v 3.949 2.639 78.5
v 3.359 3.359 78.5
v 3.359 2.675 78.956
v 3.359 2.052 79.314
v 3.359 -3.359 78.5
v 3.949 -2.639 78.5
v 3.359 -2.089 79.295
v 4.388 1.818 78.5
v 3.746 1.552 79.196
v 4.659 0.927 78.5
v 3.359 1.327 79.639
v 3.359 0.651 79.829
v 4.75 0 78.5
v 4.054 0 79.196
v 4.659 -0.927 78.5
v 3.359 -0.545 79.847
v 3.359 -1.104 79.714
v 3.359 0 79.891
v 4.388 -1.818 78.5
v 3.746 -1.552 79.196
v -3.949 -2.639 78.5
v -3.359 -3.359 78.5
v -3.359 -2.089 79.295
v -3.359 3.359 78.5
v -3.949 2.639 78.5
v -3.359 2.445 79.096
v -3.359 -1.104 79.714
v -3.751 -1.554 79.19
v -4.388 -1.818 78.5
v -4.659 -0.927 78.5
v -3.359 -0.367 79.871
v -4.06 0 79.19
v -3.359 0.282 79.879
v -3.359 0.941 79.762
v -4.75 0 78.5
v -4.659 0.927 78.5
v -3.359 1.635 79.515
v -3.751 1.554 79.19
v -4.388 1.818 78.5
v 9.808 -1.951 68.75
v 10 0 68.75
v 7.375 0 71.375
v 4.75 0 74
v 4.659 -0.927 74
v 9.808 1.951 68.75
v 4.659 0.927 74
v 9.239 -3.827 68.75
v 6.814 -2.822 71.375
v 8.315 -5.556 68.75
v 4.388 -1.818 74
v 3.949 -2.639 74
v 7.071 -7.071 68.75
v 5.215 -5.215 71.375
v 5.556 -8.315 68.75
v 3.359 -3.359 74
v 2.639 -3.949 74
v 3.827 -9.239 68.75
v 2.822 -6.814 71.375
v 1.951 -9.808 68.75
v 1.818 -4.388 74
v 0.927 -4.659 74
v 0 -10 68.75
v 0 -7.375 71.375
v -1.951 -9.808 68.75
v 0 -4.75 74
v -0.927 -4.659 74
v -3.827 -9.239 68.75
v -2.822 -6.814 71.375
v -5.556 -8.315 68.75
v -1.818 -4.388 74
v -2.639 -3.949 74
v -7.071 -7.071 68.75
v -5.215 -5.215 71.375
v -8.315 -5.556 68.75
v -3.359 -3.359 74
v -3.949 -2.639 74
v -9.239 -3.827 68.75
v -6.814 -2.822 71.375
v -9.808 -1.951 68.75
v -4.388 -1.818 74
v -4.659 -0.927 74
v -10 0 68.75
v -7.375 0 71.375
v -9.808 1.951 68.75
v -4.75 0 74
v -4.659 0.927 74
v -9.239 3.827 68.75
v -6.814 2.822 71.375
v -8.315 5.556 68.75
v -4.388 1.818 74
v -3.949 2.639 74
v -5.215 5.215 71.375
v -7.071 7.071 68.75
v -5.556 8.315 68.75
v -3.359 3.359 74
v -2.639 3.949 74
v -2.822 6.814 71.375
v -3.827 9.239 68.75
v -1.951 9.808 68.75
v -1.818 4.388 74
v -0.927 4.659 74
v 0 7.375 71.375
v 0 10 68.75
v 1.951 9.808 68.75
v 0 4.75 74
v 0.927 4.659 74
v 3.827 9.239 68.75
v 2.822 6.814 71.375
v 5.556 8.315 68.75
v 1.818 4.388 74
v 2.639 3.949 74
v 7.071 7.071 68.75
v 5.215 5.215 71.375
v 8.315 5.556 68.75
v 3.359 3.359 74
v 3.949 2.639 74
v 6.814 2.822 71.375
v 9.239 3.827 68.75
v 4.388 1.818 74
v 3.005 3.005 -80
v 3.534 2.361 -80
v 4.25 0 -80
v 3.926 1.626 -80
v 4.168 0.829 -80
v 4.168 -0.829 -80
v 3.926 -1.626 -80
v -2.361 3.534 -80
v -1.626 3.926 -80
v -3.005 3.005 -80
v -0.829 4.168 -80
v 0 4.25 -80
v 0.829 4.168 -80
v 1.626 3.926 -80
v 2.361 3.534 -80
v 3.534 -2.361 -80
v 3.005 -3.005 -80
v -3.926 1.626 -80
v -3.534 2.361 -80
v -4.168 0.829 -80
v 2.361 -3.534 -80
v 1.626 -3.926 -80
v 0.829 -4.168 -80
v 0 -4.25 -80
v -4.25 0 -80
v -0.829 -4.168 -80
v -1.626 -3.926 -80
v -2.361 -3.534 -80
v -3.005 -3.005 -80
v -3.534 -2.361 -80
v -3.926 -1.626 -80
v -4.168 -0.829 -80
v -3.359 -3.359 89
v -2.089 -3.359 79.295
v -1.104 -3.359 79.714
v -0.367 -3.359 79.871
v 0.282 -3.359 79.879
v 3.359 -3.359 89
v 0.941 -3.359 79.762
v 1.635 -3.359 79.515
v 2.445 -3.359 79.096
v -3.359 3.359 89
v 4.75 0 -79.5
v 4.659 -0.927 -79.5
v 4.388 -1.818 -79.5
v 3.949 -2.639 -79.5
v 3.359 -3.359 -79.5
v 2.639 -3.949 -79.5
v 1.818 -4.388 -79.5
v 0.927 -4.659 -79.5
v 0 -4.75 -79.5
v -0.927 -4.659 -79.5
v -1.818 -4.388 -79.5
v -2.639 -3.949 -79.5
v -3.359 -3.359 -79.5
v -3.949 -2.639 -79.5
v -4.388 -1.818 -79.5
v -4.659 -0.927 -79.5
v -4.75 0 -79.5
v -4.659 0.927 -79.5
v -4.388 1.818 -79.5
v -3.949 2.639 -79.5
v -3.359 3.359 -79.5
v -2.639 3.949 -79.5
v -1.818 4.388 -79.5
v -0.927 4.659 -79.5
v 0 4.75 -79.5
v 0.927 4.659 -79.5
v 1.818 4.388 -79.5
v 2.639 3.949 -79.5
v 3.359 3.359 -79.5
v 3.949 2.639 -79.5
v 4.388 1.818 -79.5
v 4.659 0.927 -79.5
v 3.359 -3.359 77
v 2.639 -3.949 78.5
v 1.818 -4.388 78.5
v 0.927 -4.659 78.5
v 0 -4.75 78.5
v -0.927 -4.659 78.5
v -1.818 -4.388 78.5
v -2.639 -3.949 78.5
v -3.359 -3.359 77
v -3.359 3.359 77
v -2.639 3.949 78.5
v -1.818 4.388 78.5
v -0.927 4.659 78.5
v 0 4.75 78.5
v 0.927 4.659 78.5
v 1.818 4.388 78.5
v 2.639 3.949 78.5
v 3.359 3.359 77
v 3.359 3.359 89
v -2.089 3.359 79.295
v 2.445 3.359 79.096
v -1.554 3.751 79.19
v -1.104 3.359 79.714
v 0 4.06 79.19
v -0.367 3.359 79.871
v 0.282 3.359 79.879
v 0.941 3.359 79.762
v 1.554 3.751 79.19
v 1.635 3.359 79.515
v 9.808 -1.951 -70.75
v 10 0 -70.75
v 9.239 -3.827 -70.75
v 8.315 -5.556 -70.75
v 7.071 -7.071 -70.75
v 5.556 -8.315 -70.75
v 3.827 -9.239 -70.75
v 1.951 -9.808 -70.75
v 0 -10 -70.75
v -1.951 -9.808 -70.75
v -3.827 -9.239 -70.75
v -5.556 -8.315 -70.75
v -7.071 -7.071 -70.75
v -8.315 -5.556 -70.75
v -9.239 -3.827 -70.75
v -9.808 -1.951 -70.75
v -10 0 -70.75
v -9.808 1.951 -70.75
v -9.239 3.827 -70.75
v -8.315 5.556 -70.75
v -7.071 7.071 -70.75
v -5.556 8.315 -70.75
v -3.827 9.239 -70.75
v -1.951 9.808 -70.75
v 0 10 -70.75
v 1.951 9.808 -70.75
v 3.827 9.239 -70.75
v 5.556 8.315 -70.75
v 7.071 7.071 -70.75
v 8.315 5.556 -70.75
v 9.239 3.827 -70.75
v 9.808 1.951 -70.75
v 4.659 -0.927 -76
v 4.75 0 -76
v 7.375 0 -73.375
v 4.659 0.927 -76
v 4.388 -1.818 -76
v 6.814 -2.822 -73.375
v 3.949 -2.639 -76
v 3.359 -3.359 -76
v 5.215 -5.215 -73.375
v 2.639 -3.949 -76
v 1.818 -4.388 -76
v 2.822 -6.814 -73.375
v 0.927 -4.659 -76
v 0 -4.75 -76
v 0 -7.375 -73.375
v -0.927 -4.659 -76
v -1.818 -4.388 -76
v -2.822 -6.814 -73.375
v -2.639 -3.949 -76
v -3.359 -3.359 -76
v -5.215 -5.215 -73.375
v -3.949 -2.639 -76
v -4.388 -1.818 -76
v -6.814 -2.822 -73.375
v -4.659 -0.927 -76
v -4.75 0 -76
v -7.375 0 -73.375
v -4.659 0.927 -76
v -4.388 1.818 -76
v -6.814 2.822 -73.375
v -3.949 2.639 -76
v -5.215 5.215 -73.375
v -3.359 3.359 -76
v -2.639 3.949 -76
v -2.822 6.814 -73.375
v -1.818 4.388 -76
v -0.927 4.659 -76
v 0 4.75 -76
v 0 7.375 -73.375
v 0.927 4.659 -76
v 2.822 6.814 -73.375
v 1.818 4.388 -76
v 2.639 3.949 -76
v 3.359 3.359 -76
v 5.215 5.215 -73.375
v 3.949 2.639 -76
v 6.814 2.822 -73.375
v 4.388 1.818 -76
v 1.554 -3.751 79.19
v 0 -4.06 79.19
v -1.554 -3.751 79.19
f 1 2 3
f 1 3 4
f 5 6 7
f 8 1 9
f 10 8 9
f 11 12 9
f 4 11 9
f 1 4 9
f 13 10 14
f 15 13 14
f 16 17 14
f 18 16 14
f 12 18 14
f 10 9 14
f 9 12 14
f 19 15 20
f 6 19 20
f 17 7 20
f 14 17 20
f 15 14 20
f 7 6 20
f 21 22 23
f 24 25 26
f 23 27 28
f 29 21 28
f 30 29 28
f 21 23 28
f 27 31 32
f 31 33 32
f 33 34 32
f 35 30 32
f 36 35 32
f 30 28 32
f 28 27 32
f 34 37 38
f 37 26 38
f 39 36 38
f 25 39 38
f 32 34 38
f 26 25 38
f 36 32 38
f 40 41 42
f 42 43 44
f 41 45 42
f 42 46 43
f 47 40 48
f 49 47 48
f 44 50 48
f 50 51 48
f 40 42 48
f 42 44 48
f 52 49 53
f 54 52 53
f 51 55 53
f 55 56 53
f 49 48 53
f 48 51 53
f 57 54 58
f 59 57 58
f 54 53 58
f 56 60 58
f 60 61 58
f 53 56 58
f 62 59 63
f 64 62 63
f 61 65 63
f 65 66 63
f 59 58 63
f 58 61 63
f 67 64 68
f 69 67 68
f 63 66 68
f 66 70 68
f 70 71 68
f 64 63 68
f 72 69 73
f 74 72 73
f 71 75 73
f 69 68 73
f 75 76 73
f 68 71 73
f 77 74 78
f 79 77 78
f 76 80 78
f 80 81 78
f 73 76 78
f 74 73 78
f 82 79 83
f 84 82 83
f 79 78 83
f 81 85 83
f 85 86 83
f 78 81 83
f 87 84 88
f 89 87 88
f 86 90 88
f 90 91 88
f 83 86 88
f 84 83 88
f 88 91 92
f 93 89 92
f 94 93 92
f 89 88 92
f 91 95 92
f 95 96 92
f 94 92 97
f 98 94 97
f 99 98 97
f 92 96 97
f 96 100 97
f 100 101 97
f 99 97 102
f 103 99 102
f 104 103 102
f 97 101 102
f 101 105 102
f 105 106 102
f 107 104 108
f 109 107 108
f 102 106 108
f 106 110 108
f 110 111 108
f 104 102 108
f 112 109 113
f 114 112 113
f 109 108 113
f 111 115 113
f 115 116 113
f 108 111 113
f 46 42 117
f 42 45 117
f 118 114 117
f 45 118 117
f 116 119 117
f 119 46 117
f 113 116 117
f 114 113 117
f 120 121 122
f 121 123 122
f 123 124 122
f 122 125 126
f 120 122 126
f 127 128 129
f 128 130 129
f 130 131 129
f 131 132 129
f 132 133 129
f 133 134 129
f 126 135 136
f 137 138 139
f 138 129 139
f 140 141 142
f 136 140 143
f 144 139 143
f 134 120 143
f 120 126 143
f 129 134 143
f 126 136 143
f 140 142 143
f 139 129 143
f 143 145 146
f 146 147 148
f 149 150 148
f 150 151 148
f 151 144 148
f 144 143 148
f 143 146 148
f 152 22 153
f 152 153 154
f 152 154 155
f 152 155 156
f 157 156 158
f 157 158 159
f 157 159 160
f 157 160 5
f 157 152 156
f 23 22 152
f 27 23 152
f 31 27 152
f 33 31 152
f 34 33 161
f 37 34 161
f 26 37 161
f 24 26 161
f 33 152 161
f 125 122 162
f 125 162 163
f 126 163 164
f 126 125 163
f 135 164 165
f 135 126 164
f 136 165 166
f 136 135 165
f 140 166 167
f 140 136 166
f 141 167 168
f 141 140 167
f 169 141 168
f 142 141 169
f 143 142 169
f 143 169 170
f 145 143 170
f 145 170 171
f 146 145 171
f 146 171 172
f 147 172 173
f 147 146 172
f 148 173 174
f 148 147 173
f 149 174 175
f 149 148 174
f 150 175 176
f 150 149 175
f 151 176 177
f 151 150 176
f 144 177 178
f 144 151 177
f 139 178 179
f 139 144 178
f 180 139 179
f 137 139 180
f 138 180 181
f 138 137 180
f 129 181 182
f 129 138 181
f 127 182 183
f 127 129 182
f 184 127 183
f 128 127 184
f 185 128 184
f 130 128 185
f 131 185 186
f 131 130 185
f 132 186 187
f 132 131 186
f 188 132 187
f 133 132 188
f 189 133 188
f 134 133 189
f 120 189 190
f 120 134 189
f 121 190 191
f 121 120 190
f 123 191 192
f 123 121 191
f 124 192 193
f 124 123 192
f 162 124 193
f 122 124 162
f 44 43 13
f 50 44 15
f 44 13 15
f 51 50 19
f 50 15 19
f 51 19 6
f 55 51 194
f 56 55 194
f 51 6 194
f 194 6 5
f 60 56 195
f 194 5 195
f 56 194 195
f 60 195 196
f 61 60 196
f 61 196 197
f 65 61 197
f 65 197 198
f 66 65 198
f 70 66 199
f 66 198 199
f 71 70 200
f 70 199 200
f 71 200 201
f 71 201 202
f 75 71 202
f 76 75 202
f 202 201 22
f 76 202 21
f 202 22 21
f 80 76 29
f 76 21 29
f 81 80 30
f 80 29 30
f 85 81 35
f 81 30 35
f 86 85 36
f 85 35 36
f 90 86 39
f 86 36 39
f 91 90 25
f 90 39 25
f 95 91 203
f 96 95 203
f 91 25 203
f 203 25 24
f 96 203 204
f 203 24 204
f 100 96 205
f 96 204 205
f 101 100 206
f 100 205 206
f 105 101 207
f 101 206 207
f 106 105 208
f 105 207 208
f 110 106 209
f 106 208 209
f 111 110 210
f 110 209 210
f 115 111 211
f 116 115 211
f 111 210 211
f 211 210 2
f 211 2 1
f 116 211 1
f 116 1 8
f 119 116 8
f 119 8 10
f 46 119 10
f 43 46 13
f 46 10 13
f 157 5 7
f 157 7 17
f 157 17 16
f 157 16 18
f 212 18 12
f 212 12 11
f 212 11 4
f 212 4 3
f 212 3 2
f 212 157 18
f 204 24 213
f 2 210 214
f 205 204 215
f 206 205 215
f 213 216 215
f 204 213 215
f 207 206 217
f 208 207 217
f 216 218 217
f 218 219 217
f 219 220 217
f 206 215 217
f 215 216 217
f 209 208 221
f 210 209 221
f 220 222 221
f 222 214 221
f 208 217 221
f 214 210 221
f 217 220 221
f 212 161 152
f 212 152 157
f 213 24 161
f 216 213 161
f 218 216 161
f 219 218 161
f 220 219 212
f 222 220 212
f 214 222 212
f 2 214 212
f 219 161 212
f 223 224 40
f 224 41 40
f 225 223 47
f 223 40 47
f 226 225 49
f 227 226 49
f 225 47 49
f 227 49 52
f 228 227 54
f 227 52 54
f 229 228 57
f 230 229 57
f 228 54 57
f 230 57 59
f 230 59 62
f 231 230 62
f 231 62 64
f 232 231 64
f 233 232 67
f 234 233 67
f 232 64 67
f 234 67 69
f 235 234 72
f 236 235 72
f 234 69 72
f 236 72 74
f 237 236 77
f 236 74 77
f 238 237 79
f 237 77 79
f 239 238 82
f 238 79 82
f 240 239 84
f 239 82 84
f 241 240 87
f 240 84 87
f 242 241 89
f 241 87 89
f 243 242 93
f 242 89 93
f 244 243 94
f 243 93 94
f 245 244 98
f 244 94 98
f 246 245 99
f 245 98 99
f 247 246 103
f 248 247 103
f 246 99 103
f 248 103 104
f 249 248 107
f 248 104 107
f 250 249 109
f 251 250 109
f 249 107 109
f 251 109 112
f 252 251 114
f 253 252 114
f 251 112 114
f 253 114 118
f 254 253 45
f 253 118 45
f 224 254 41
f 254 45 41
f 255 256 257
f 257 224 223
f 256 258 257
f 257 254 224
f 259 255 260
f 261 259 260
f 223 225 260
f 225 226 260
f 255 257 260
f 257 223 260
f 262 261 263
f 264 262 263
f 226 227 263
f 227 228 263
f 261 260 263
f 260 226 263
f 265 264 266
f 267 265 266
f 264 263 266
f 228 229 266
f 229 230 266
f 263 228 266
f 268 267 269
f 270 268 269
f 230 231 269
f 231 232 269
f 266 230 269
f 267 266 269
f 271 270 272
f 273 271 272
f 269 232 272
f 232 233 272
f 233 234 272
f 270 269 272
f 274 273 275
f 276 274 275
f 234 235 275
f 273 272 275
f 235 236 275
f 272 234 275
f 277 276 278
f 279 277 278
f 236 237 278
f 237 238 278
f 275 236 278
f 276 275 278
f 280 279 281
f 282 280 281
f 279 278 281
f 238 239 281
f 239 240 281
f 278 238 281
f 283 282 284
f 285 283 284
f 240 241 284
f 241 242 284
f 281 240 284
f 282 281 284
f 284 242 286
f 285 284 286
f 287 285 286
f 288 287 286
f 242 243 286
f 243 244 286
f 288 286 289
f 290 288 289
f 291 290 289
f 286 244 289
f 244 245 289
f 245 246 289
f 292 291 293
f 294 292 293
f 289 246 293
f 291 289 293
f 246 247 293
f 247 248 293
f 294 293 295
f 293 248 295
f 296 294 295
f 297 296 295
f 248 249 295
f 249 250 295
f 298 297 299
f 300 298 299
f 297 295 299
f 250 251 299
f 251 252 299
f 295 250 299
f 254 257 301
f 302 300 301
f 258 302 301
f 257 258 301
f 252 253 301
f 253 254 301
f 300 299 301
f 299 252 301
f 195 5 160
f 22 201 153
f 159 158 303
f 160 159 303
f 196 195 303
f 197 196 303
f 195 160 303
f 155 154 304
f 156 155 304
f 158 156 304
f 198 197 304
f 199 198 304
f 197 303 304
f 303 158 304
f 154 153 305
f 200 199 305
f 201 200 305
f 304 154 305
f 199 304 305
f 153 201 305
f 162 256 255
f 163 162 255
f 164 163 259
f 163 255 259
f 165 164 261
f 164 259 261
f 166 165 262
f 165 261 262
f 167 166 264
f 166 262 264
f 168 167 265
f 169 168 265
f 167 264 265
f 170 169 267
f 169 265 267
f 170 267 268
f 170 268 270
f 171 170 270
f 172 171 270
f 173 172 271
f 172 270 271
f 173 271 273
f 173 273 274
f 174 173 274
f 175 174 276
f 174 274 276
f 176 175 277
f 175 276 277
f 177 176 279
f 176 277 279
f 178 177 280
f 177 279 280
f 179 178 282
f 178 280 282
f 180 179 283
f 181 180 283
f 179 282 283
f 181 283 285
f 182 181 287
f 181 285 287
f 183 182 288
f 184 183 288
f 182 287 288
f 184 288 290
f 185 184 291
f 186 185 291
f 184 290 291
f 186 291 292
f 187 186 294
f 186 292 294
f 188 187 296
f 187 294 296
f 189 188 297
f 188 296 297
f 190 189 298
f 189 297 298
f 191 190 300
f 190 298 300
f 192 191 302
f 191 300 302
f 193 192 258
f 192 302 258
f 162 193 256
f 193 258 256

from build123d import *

# Parameters (mm, degrees)
F2_SIZE       = 1.5
F3_W          = 6.717514
F3_H          = 6.717514
F4_DEPTH      = 9
F4_DEPTH_BACK = 3
F5_SIZE       = 0.5


with BuildPart() as f1:
    # F0 (on Front) → F1 (revolve)
    with BuildSketch(Plane.XZ):
        Polygon((0, 80), (0, -80), (4.75, -80), (4.75, -76), (10, -70.75), (10, 68.75), (4.75, 74), (4.75, 80), align=None)
    revolve(axis=Axis((0, 0, 0), (0, 0, -1)))

    # F2
    f2_edges = [f1.edges().sort_by_distance(p)[0] for p in [
        (-4.75, 0, 80),
    ]]
    chamfer(f2_edges, length=F2_SIZE)

    # F3 (on face) → F4 (join, two sides)
    with BuildSketch(Plane.XY.offset(80)) as f4_sk:
        Rectangle(F3_W, F3_H)
    extrude(amount=F4_DEPTH)
    extrude(f4_sk.sketch, amount=-F4_DEPTH_BACK)

    # F5
    f5_edges = [f1.edges().sort_by_distance(p)[0] for p in [
        (-4.75, 0, -80),
    ]]
    chamfer(f5_edges, length=F5_SIZE)


solid = f1.part
